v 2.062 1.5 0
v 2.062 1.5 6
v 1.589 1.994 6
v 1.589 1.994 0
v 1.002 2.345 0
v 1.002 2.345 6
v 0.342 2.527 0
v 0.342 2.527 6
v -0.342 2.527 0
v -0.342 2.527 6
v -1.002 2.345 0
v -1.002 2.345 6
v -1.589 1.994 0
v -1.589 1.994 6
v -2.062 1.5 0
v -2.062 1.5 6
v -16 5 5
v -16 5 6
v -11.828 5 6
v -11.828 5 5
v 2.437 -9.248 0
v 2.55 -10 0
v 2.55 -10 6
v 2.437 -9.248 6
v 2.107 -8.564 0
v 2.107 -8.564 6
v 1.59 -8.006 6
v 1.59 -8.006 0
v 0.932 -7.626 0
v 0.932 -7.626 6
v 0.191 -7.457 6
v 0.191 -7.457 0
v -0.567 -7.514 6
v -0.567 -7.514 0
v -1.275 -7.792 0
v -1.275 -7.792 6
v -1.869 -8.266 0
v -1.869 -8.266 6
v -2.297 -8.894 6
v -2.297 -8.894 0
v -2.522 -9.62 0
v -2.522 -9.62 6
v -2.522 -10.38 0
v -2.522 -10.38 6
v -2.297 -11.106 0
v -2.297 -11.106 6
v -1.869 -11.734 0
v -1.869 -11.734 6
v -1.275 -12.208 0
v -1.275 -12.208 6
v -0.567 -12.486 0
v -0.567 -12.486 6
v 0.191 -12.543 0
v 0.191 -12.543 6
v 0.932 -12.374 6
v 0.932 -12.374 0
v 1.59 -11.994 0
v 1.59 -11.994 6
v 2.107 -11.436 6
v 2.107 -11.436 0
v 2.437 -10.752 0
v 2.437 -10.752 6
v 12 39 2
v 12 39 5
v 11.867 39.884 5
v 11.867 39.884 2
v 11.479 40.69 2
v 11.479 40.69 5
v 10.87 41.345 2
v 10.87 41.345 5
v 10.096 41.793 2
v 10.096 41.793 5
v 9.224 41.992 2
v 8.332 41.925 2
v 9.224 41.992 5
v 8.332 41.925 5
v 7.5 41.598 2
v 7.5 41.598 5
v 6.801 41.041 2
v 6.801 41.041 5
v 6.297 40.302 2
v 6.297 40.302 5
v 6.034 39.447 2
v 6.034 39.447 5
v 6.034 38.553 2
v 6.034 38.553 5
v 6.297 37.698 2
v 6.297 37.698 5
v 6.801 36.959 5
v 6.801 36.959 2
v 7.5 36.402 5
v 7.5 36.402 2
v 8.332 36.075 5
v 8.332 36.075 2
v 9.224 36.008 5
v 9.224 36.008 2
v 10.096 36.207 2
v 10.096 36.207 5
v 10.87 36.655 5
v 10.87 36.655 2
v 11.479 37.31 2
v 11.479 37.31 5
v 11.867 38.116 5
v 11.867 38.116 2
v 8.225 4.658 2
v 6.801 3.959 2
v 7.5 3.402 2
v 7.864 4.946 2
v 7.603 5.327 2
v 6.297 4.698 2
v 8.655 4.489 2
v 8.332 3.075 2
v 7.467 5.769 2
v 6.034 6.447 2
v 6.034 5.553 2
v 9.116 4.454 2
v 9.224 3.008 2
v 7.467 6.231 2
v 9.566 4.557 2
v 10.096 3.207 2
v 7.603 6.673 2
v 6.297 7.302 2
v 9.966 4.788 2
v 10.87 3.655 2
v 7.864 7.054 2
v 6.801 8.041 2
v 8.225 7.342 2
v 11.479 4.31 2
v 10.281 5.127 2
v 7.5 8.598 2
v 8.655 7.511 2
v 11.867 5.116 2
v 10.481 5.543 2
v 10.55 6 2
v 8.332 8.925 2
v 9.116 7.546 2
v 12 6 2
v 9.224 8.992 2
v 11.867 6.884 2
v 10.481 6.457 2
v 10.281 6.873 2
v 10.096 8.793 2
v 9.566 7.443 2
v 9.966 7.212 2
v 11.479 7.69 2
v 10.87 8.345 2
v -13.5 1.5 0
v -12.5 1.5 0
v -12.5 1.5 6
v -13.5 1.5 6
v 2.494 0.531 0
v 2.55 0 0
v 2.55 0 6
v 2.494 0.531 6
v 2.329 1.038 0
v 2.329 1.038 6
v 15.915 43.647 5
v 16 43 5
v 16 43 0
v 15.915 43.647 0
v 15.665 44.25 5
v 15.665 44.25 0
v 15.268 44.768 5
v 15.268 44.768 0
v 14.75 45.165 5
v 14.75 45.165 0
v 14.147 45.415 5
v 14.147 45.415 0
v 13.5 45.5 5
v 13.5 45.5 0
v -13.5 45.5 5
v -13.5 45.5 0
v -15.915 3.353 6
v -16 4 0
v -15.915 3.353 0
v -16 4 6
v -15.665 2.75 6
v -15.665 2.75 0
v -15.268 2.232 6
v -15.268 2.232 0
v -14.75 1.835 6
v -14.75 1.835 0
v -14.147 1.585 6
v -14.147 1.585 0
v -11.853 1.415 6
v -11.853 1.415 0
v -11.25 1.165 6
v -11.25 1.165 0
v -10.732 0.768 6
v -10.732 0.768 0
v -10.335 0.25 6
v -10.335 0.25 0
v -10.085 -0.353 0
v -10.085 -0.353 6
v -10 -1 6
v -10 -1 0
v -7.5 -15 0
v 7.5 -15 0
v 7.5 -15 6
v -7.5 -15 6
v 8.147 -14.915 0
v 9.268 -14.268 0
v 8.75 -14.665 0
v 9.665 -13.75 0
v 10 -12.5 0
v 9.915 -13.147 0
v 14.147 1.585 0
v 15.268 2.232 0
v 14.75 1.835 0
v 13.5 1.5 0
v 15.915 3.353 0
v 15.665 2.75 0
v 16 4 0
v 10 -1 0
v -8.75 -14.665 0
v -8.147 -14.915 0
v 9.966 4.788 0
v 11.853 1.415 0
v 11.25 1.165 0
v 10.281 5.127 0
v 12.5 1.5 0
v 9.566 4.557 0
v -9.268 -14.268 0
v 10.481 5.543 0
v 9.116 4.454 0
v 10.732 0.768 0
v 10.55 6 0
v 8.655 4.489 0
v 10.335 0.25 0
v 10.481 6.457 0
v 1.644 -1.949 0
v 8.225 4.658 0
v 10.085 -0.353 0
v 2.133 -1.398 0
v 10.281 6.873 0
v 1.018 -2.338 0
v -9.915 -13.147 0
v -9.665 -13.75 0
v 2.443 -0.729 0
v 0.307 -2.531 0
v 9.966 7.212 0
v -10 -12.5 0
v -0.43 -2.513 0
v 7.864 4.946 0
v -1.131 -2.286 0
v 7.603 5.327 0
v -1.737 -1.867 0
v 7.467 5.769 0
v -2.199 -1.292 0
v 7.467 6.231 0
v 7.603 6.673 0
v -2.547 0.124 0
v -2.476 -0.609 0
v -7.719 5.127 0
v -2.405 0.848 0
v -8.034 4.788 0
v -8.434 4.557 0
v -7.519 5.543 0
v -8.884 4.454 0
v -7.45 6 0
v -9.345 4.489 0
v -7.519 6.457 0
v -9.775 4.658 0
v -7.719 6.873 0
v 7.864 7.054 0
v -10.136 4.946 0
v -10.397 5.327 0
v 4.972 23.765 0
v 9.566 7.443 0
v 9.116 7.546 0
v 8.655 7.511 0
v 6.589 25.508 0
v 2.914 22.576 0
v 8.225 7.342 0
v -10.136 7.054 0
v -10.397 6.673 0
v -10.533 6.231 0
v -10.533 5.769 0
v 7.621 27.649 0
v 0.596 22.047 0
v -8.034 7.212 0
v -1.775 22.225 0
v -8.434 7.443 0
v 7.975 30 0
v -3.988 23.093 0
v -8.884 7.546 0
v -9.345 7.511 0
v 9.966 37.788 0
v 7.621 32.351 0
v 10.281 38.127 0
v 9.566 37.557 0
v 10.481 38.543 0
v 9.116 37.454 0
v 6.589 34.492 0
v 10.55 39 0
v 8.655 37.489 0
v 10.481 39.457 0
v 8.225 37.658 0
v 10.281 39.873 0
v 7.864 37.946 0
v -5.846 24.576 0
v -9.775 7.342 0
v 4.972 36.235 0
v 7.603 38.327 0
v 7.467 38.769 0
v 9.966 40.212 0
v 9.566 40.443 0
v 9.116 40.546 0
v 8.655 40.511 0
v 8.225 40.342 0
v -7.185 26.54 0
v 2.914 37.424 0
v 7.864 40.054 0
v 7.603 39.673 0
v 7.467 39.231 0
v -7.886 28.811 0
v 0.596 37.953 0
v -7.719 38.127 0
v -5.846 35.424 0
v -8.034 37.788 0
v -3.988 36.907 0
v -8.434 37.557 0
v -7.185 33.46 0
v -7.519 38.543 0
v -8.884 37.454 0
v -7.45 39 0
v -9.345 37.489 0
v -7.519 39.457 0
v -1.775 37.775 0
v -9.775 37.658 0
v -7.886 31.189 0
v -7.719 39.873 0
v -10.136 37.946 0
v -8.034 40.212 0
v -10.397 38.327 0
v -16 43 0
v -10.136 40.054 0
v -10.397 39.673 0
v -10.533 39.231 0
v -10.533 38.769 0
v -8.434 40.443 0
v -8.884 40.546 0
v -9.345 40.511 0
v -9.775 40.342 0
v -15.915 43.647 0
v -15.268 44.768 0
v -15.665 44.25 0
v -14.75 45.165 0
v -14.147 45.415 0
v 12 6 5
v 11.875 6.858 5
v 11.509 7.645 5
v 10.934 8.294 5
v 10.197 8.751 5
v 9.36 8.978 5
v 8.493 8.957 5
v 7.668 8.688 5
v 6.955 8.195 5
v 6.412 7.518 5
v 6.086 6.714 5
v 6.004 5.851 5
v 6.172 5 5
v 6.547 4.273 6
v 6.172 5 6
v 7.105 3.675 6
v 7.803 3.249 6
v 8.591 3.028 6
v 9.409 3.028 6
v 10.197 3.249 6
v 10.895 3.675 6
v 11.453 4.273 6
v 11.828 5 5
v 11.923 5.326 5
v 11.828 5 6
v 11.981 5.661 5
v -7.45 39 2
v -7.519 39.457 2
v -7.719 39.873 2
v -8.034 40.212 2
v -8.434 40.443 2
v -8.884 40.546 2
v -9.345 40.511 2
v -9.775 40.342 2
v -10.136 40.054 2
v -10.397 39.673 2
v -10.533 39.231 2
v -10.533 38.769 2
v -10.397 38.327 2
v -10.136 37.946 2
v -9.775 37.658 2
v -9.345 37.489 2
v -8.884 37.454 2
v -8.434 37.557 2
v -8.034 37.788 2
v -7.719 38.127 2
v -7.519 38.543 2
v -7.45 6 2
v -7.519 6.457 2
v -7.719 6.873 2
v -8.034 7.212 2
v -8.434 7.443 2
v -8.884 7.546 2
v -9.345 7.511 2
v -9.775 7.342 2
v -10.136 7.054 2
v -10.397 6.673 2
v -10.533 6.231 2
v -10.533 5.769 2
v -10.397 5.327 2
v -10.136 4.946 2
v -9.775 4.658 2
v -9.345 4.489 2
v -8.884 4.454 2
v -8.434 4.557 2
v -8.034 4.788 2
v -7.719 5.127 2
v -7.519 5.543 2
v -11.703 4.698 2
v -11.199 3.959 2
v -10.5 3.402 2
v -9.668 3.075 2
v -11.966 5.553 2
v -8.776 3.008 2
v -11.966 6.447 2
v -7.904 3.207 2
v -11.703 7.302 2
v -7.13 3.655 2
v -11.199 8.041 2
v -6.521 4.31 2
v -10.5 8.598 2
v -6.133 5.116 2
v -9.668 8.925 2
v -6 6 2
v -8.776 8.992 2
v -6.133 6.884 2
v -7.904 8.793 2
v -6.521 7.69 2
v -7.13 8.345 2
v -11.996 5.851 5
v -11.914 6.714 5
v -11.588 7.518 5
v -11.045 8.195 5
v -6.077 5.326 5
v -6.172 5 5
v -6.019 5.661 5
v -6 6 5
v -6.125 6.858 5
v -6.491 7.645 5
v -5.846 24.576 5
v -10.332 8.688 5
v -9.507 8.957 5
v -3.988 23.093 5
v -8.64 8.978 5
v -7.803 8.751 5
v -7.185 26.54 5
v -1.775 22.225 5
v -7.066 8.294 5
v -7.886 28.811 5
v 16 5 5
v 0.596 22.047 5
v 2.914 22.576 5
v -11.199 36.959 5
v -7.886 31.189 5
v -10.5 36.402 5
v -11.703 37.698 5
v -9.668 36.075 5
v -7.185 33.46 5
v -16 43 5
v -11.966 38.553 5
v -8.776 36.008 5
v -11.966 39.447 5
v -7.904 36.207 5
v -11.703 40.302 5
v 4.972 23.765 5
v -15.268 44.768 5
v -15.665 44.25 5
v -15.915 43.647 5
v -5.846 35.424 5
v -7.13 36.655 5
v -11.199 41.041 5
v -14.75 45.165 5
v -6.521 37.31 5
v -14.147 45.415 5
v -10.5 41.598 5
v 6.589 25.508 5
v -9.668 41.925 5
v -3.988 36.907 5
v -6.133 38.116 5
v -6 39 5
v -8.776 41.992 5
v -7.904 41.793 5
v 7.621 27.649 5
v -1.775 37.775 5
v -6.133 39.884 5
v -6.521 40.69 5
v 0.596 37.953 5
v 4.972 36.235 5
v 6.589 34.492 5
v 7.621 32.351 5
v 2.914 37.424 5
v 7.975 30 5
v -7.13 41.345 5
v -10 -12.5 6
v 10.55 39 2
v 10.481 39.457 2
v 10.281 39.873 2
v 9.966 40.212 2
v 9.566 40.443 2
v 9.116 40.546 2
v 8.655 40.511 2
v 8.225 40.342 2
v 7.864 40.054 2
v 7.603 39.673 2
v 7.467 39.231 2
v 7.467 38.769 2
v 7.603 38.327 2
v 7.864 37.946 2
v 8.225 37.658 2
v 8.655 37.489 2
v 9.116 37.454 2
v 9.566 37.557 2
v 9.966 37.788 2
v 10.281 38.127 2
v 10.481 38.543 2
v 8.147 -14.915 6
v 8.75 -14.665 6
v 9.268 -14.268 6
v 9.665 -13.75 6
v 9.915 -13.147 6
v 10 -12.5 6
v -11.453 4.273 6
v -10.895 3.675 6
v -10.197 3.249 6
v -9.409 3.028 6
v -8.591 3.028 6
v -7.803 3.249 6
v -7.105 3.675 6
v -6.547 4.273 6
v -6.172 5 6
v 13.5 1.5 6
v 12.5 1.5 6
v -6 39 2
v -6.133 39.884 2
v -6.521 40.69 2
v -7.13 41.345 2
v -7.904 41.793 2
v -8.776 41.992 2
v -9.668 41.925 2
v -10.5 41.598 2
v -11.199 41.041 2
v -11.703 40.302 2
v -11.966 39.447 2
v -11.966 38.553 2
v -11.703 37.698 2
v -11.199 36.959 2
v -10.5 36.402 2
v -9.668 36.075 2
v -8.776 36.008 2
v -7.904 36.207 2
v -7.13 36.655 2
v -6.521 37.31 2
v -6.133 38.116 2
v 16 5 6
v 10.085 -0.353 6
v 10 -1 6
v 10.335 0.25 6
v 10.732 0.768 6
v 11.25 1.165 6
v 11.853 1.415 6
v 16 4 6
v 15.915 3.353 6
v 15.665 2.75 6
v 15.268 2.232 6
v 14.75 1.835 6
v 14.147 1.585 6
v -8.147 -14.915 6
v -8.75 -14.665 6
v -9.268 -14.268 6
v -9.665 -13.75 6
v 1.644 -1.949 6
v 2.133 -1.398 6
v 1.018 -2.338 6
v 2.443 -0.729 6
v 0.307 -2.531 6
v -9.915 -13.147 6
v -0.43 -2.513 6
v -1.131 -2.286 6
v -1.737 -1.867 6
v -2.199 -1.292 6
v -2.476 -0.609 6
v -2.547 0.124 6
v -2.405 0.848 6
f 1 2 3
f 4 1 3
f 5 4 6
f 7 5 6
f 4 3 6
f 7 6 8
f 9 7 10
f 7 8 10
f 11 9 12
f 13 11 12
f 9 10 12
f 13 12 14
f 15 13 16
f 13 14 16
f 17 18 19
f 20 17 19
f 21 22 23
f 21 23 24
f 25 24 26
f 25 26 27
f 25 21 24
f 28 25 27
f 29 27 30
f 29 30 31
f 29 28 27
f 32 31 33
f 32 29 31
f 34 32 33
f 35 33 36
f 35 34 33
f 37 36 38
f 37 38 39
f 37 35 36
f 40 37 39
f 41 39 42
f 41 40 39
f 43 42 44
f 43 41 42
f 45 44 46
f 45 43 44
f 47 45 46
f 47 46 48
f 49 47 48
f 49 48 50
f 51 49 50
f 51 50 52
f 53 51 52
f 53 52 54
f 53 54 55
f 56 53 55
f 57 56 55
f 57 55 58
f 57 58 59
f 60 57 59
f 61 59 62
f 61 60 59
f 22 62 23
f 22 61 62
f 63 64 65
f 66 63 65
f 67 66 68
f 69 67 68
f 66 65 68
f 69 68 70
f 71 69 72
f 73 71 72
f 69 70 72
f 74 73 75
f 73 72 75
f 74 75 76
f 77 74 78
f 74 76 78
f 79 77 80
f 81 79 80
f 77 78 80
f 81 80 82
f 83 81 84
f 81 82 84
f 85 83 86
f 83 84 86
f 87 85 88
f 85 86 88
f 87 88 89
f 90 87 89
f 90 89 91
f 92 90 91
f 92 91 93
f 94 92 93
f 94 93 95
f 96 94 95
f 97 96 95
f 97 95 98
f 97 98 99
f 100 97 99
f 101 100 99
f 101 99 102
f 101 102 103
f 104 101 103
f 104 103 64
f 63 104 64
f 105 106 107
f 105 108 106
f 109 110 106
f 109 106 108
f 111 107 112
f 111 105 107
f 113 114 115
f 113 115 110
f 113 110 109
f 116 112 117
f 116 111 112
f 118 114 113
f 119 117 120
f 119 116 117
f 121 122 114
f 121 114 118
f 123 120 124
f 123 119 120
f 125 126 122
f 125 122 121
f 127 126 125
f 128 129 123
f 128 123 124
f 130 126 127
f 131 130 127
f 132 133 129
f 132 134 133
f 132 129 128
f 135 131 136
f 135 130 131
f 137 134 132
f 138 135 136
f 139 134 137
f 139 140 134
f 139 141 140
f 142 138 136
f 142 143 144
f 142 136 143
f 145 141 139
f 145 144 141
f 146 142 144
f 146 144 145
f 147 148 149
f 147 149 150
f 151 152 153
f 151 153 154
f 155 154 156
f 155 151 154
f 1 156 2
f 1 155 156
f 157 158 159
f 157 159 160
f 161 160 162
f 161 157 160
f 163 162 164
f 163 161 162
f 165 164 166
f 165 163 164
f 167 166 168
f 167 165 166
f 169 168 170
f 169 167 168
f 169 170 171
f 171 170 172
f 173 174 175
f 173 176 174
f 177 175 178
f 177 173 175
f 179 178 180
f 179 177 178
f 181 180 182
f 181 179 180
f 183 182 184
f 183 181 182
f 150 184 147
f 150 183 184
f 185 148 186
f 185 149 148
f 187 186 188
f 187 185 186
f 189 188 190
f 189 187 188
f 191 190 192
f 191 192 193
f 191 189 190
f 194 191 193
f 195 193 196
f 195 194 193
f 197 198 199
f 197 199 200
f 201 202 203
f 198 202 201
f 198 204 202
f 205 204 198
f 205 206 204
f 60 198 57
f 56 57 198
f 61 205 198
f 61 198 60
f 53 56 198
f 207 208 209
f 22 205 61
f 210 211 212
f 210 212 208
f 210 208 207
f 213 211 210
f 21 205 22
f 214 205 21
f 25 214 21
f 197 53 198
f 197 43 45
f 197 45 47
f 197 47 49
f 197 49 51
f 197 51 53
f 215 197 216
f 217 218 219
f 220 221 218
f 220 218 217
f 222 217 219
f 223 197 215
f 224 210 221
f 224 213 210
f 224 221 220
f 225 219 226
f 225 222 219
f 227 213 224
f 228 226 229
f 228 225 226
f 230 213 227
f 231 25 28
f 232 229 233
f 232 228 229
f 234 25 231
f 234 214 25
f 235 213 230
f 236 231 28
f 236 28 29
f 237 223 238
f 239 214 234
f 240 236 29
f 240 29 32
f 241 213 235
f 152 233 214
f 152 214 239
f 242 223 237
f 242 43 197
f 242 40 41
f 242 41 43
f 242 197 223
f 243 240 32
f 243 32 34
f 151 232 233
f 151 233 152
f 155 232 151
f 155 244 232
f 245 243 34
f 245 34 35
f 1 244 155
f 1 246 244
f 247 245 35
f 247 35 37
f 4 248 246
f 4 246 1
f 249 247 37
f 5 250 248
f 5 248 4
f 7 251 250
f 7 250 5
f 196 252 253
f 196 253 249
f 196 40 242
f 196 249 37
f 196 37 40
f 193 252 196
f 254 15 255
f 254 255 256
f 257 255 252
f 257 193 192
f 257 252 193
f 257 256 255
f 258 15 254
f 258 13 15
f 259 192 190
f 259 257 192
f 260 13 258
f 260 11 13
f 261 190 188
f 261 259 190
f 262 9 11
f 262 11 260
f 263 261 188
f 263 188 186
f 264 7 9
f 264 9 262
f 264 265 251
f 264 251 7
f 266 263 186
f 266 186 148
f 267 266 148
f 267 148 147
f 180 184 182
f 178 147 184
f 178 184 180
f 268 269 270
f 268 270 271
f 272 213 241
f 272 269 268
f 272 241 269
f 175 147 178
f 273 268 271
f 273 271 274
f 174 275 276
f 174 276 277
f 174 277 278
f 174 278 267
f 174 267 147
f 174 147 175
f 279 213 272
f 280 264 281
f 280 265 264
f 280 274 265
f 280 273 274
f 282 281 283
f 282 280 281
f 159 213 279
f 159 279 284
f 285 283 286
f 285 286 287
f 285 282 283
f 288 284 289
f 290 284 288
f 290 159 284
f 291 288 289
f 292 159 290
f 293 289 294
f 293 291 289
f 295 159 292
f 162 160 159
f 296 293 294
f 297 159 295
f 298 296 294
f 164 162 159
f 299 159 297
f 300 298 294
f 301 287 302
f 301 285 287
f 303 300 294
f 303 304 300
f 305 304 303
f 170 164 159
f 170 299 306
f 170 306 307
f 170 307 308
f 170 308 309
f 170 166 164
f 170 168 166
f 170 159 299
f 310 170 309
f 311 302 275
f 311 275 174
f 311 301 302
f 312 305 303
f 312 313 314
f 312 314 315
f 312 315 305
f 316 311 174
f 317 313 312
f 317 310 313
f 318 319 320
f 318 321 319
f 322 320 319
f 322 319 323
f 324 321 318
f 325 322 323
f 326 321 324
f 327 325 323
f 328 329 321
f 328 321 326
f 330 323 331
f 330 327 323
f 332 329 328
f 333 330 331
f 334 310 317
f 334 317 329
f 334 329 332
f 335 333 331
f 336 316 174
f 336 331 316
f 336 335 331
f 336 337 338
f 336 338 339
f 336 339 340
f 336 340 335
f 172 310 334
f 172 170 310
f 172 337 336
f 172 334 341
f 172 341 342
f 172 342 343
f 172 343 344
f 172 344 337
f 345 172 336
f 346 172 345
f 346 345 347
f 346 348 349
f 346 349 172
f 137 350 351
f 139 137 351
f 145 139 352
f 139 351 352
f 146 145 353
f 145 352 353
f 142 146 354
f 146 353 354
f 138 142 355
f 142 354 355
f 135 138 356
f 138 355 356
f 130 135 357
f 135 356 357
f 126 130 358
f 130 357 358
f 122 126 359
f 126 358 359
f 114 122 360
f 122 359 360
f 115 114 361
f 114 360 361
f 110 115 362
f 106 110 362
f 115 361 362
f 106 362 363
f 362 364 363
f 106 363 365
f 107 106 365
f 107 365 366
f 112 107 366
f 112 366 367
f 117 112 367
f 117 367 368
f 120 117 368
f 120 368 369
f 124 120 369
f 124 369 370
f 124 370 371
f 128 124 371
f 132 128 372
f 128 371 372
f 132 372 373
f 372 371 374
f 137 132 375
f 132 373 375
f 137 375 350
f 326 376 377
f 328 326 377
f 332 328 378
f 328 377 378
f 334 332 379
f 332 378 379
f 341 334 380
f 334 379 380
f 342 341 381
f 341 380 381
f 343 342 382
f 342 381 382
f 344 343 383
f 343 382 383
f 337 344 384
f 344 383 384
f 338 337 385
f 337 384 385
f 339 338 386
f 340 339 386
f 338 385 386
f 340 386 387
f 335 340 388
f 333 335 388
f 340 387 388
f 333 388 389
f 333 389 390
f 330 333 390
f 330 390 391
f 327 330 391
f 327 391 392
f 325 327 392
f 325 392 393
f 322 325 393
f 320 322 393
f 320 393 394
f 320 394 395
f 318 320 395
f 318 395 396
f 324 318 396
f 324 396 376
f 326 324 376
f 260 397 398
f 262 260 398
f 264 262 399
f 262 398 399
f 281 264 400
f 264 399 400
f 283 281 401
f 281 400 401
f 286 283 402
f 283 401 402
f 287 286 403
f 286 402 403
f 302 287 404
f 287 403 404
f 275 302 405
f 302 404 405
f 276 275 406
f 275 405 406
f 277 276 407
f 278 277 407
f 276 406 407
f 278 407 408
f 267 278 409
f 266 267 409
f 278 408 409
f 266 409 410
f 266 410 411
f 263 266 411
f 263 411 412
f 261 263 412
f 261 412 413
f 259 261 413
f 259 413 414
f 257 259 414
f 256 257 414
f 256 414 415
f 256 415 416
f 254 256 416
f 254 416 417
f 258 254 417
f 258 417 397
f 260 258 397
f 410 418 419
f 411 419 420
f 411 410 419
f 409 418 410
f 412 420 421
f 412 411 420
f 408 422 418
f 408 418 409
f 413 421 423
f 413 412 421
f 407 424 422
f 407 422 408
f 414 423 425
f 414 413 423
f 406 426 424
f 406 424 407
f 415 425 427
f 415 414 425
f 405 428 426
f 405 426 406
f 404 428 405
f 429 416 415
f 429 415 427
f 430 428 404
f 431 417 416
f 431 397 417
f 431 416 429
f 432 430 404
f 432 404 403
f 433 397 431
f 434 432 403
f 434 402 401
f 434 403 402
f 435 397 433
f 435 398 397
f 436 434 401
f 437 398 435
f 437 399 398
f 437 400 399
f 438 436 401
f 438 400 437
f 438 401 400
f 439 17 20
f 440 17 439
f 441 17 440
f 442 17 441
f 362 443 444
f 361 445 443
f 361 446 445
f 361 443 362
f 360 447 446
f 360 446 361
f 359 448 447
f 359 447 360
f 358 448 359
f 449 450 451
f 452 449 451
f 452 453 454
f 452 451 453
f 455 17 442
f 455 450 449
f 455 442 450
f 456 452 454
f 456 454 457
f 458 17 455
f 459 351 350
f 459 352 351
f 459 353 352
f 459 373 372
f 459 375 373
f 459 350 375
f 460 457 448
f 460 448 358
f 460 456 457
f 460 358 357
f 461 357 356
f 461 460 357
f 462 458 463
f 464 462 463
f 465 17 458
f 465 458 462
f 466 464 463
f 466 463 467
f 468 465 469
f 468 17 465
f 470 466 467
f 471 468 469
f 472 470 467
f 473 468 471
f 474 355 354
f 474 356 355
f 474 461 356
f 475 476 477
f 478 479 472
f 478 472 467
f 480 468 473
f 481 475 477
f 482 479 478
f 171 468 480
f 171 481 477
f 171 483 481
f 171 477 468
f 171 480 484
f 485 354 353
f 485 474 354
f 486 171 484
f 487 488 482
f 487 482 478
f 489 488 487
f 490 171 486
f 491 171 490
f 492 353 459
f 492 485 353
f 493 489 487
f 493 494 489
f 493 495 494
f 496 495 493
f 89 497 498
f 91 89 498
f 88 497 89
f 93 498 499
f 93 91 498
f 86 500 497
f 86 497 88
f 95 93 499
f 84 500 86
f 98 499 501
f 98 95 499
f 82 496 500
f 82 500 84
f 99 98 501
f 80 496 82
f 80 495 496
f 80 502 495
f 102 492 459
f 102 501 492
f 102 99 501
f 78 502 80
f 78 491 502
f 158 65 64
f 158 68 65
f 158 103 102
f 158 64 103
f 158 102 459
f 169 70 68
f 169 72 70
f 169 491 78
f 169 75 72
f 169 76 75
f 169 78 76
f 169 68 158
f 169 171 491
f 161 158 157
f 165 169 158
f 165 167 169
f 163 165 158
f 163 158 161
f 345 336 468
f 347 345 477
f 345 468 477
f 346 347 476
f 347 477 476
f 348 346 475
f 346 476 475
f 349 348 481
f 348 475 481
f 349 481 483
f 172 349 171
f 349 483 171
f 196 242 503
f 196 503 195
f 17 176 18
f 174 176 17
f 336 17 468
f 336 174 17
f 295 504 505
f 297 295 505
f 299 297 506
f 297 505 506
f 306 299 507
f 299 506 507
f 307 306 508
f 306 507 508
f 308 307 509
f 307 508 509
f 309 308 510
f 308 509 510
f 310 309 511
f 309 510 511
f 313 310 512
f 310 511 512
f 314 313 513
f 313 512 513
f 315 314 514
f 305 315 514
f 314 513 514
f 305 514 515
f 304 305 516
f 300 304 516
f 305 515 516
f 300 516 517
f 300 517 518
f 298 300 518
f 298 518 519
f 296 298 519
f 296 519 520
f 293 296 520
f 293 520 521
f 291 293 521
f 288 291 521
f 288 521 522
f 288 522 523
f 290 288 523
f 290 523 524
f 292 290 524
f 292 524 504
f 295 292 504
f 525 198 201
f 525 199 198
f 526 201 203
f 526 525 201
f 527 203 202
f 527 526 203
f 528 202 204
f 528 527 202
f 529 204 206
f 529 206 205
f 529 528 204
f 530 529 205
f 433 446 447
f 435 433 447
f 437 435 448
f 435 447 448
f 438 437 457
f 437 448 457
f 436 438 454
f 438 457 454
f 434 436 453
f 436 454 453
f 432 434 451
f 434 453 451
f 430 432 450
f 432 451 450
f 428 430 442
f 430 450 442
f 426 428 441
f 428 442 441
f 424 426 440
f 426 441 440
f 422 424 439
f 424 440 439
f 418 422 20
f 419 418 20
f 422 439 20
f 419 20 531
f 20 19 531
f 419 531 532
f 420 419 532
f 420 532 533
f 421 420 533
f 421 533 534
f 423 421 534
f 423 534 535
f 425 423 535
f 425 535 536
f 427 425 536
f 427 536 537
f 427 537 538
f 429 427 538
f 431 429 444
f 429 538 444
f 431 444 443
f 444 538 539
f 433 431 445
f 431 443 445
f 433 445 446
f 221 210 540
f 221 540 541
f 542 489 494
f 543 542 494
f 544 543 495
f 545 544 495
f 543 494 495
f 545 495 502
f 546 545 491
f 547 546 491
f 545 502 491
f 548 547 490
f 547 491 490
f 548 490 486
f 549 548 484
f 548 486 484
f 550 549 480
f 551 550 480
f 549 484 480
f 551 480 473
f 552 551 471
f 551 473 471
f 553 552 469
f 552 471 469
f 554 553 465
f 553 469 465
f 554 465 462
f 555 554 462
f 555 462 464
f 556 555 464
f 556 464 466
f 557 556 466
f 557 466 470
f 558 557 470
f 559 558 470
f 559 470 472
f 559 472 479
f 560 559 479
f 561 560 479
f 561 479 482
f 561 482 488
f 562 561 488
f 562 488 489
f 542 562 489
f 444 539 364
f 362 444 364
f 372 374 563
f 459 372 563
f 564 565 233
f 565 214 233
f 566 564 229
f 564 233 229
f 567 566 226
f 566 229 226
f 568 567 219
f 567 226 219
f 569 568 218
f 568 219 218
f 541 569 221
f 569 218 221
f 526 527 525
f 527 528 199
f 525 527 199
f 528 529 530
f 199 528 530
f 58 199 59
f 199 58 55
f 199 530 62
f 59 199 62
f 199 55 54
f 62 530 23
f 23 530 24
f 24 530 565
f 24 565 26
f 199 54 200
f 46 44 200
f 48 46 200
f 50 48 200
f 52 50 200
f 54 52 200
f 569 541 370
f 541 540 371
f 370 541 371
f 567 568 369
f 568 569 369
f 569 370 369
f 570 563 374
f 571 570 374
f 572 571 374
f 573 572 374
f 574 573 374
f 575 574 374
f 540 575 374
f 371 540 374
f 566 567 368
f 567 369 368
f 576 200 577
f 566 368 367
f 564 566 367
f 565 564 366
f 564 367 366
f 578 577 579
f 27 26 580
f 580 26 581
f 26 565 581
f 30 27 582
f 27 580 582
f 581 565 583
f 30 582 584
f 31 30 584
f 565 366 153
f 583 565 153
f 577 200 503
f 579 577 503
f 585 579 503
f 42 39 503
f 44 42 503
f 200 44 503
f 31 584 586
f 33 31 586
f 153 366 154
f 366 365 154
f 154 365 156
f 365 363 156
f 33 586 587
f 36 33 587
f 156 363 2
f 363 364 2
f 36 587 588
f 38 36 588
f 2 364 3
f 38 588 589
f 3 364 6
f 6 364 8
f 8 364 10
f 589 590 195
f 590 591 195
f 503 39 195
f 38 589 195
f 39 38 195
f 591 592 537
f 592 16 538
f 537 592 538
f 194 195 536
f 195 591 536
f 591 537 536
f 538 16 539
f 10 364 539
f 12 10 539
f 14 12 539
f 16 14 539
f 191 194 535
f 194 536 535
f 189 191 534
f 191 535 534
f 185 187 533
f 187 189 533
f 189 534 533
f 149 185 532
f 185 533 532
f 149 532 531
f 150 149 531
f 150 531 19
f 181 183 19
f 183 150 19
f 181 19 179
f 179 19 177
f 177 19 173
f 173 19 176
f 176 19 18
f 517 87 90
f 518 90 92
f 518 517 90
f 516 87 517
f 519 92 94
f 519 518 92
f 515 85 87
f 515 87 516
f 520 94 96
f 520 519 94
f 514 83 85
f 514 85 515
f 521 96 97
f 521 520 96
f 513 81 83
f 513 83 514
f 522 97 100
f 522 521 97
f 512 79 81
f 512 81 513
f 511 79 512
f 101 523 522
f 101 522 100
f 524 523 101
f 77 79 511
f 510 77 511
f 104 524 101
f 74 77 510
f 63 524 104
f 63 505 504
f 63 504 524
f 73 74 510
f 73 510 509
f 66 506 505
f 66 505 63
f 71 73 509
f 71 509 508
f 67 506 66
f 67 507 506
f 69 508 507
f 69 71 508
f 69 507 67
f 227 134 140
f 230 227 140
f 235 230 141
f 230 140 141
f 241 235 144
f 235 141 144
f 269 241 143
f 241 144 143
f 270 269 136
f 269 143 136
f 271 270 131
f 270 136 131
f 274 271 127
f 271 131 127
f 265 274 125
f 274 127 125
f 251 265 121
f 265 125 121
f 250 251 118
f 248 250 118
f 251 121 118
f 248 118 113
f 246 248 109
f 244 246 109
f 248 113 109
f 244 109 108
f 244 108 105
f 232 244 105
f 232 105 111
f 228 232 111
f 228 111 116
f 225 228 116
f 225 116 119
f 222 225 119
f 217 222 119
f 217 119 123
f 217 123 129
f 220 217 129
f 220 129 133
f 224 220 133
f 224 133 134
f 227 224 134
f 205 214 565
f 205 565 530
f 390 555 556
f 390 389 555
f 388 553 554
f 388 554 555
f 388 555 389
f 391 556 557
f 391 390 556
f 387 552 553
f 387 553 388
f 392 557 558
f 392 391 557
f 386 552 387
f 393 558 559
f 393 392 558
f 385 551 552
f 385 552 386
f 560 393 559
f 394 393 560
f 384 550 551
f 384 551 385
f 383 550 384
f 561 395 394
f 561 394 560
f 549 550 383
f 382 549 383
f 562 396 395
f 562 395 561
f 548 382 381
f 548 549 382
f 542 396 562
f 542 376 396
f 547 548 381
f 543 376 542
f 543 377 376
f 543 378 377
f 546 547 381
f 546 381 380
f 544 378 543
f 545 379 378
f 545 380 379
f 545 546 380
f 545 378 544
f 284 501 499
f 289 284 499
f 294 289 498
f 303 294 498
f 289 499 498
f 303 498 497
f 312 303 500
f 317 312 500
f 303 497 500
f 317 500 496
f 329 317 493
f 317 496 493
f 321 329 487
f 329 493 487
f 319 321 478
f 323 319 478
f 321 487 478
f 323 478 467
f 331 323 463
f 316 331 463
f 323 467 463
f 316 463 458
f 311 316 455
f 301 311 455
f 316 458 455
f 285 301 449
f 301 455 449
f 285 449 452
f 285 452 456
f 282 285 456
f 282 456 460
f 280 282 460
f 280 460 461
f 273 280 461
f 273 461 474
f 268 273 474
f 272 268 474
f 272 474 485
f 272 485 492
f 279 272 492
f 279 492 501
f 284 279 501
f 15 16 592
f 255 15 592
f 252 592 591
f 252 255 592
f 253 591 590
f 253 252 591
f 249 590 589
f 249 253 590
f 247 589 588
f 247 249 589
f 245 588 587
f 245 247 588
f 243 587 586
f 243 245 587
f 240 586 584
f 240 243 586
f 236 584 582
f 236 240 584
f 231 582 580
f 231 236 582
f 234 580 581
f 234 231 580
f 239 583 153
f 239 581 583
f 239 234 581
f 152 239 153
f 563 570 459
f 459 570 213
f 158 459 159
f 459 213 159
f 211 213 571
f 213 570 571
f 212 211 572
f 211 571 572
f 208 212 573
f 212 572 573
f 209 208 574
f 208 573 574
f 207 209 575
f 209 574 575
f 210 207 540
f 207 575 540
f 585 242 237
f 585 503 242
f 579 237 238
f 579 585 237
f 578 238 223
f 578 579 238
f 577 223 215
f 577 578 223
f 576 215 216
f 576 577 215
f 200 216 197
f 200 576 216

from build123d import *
from build123d.topology import SkipClean

# Parameters (mm, degrees)
SKETCH1_R           = 2.55
BOSS_EXTRUDE2_DEPTH = 6
SKETCH7_W           = 32
SKETCH7_H           = 44
BOSS_EXTRUDE3_DEPTH = 6
FILLET1_R           = 2.5
SKETCH3_R           = 7.975
CUT_EXTRUDE2_DEPTH  = 49.602983448
SKETCH2_R           = 1.55
CUT_EXTRUDE1_DEPTH  = 49.602983448
SKETCH6_W           = 60
SKETCH6_H           = 50
CUT_EXTRUDE5_DEPTH  = 1
SKETCH8_R           = 3
CUT_EXTRUDE6_DEPTH  = 4
SKETCH9_R           = 2.55
CUT_EXTRUDE7_DEPTH  = 49.602983448


with BuildPart() as part:
    # Sketch1 → Boss-Extrude2 (new body)
    with BuildSketch(Plane.XY):
        with BuildLine():
            Line((-10, -15), (-10, 15))
            Line((-10, 15), (-15, 30))
            ThreePointArc((-15, 30), (0, 45), (15, 30))
            Line((15, 30), (10, 15))
            Line((10, 15), (10, -15))
            Line((10, -15), (-10, -15))
        make_face()
        Circle(SKETCH1_R, mode=Mode.SUBTRACT)
        with Locations((0, -10)):
            Circle(SKETCH1_R, mode=Mode.SUBTRACT)
    extrude(amount=BOSS_EXTRUDE2_DEPTH)

    # Sketch7 → Boss-Extrude3 (add)
    with BuildSketch(Plane(origin=(0, 0, 0), x_dir=(-1, 0, 0), z_dir=(0, 0, -1))):
        with Locations((0, 23.5)):
            Rectangle(SKETCH7_W, SKETCH7_H)
    extrude(amount=-BOSS_EXTRUDE3_DEPTH)

    # Fillet1
    fillet1_edges = [part.edges().sort_by_distance(p)[0] for p in [
        (10, -15, 3),
        (-10, -15, 3),
        (-16, 1.5, 3),
        (-10, 1.5, 3),
        (10, 1.5, 3),
        (16, 1.5, 3),
        (16, 45.5, 3),
        (-16, 45.5, 3),
    ]]
    fillet(fillet1_edges, radius=FILLET1_R)

    # Sketch3 → Cut-Extrude2 (cut, through all)
    with BuildSketch(Plane.XY.offset(6)):
        with Locations((0, 30)):
            Circle(SKETCH3_R)
    extrude(amount=-CUT_EXTRUDE2_DEPTH, mode=Mode.SUBTRACT)

    # Sketch2 → Cut-Extrude1 (cut, through all)
    with BuildSketch(Plane.XY.offset(6)):
        with Locations((-9, 39)):
            Circle(SKETCH2_R)
        with Locations((9, 39)):
            Circle(SKETCH2_R)
        with Locations((9, 6)):
            Circle(SKETCH2_R)
        with Locations((-9, 6)):
            Circle(SKETCH2_R)
    extrude(amount=-CUT_EXTRUDE1_DEPTH, mode=Mode.SUBTRACT)

    # Sketch6 → Cut-Extrude5 (cut)
    with BuildSketch(Plane.XY.offset(6)):
        with Locations((0, 30)):
            Rectangle(SKETCH6_W, SKETCH6_H)
    extrude(amount=-CUT_EXTRUDE5_DEPTH, mode=Mode.SUBTRACT)

    # Sketch8 → Cut-Extrude6 (cut)
    with BuildSketch(Plane.XY.offset(6)):
        with Locations((-9, 39)):
            Circle(SKETCH8_R)
        with Locations((9, 39)):
            Circle(SKETCH8_R)
        with Locations((9, 6)):
            Circle(SKETCH8_R)
        with Locations((-9, 6)):
            Circle(SKETCH8_R)
    extrude(amount=-CUT_EXTRUDE6_DEPTH, mode=Mode.SUBTRACT)

    # Sketch9 → Cut-Extrude7 (cut, through all)
    with SkipClean():  # the faces are left unmerged after this step: merging them gives an invalid solid
        with BuildSketch(Plane.XY.offset(6)):
            with Locations((0, -10)):
                Circle(SKETCH9_R)
            Circle(SKETCH9_R)
        extrude(amount=-CUT_EXTRUDE7_DEPTH, mode=Mode.SUBTRACT)


solid = part.part
